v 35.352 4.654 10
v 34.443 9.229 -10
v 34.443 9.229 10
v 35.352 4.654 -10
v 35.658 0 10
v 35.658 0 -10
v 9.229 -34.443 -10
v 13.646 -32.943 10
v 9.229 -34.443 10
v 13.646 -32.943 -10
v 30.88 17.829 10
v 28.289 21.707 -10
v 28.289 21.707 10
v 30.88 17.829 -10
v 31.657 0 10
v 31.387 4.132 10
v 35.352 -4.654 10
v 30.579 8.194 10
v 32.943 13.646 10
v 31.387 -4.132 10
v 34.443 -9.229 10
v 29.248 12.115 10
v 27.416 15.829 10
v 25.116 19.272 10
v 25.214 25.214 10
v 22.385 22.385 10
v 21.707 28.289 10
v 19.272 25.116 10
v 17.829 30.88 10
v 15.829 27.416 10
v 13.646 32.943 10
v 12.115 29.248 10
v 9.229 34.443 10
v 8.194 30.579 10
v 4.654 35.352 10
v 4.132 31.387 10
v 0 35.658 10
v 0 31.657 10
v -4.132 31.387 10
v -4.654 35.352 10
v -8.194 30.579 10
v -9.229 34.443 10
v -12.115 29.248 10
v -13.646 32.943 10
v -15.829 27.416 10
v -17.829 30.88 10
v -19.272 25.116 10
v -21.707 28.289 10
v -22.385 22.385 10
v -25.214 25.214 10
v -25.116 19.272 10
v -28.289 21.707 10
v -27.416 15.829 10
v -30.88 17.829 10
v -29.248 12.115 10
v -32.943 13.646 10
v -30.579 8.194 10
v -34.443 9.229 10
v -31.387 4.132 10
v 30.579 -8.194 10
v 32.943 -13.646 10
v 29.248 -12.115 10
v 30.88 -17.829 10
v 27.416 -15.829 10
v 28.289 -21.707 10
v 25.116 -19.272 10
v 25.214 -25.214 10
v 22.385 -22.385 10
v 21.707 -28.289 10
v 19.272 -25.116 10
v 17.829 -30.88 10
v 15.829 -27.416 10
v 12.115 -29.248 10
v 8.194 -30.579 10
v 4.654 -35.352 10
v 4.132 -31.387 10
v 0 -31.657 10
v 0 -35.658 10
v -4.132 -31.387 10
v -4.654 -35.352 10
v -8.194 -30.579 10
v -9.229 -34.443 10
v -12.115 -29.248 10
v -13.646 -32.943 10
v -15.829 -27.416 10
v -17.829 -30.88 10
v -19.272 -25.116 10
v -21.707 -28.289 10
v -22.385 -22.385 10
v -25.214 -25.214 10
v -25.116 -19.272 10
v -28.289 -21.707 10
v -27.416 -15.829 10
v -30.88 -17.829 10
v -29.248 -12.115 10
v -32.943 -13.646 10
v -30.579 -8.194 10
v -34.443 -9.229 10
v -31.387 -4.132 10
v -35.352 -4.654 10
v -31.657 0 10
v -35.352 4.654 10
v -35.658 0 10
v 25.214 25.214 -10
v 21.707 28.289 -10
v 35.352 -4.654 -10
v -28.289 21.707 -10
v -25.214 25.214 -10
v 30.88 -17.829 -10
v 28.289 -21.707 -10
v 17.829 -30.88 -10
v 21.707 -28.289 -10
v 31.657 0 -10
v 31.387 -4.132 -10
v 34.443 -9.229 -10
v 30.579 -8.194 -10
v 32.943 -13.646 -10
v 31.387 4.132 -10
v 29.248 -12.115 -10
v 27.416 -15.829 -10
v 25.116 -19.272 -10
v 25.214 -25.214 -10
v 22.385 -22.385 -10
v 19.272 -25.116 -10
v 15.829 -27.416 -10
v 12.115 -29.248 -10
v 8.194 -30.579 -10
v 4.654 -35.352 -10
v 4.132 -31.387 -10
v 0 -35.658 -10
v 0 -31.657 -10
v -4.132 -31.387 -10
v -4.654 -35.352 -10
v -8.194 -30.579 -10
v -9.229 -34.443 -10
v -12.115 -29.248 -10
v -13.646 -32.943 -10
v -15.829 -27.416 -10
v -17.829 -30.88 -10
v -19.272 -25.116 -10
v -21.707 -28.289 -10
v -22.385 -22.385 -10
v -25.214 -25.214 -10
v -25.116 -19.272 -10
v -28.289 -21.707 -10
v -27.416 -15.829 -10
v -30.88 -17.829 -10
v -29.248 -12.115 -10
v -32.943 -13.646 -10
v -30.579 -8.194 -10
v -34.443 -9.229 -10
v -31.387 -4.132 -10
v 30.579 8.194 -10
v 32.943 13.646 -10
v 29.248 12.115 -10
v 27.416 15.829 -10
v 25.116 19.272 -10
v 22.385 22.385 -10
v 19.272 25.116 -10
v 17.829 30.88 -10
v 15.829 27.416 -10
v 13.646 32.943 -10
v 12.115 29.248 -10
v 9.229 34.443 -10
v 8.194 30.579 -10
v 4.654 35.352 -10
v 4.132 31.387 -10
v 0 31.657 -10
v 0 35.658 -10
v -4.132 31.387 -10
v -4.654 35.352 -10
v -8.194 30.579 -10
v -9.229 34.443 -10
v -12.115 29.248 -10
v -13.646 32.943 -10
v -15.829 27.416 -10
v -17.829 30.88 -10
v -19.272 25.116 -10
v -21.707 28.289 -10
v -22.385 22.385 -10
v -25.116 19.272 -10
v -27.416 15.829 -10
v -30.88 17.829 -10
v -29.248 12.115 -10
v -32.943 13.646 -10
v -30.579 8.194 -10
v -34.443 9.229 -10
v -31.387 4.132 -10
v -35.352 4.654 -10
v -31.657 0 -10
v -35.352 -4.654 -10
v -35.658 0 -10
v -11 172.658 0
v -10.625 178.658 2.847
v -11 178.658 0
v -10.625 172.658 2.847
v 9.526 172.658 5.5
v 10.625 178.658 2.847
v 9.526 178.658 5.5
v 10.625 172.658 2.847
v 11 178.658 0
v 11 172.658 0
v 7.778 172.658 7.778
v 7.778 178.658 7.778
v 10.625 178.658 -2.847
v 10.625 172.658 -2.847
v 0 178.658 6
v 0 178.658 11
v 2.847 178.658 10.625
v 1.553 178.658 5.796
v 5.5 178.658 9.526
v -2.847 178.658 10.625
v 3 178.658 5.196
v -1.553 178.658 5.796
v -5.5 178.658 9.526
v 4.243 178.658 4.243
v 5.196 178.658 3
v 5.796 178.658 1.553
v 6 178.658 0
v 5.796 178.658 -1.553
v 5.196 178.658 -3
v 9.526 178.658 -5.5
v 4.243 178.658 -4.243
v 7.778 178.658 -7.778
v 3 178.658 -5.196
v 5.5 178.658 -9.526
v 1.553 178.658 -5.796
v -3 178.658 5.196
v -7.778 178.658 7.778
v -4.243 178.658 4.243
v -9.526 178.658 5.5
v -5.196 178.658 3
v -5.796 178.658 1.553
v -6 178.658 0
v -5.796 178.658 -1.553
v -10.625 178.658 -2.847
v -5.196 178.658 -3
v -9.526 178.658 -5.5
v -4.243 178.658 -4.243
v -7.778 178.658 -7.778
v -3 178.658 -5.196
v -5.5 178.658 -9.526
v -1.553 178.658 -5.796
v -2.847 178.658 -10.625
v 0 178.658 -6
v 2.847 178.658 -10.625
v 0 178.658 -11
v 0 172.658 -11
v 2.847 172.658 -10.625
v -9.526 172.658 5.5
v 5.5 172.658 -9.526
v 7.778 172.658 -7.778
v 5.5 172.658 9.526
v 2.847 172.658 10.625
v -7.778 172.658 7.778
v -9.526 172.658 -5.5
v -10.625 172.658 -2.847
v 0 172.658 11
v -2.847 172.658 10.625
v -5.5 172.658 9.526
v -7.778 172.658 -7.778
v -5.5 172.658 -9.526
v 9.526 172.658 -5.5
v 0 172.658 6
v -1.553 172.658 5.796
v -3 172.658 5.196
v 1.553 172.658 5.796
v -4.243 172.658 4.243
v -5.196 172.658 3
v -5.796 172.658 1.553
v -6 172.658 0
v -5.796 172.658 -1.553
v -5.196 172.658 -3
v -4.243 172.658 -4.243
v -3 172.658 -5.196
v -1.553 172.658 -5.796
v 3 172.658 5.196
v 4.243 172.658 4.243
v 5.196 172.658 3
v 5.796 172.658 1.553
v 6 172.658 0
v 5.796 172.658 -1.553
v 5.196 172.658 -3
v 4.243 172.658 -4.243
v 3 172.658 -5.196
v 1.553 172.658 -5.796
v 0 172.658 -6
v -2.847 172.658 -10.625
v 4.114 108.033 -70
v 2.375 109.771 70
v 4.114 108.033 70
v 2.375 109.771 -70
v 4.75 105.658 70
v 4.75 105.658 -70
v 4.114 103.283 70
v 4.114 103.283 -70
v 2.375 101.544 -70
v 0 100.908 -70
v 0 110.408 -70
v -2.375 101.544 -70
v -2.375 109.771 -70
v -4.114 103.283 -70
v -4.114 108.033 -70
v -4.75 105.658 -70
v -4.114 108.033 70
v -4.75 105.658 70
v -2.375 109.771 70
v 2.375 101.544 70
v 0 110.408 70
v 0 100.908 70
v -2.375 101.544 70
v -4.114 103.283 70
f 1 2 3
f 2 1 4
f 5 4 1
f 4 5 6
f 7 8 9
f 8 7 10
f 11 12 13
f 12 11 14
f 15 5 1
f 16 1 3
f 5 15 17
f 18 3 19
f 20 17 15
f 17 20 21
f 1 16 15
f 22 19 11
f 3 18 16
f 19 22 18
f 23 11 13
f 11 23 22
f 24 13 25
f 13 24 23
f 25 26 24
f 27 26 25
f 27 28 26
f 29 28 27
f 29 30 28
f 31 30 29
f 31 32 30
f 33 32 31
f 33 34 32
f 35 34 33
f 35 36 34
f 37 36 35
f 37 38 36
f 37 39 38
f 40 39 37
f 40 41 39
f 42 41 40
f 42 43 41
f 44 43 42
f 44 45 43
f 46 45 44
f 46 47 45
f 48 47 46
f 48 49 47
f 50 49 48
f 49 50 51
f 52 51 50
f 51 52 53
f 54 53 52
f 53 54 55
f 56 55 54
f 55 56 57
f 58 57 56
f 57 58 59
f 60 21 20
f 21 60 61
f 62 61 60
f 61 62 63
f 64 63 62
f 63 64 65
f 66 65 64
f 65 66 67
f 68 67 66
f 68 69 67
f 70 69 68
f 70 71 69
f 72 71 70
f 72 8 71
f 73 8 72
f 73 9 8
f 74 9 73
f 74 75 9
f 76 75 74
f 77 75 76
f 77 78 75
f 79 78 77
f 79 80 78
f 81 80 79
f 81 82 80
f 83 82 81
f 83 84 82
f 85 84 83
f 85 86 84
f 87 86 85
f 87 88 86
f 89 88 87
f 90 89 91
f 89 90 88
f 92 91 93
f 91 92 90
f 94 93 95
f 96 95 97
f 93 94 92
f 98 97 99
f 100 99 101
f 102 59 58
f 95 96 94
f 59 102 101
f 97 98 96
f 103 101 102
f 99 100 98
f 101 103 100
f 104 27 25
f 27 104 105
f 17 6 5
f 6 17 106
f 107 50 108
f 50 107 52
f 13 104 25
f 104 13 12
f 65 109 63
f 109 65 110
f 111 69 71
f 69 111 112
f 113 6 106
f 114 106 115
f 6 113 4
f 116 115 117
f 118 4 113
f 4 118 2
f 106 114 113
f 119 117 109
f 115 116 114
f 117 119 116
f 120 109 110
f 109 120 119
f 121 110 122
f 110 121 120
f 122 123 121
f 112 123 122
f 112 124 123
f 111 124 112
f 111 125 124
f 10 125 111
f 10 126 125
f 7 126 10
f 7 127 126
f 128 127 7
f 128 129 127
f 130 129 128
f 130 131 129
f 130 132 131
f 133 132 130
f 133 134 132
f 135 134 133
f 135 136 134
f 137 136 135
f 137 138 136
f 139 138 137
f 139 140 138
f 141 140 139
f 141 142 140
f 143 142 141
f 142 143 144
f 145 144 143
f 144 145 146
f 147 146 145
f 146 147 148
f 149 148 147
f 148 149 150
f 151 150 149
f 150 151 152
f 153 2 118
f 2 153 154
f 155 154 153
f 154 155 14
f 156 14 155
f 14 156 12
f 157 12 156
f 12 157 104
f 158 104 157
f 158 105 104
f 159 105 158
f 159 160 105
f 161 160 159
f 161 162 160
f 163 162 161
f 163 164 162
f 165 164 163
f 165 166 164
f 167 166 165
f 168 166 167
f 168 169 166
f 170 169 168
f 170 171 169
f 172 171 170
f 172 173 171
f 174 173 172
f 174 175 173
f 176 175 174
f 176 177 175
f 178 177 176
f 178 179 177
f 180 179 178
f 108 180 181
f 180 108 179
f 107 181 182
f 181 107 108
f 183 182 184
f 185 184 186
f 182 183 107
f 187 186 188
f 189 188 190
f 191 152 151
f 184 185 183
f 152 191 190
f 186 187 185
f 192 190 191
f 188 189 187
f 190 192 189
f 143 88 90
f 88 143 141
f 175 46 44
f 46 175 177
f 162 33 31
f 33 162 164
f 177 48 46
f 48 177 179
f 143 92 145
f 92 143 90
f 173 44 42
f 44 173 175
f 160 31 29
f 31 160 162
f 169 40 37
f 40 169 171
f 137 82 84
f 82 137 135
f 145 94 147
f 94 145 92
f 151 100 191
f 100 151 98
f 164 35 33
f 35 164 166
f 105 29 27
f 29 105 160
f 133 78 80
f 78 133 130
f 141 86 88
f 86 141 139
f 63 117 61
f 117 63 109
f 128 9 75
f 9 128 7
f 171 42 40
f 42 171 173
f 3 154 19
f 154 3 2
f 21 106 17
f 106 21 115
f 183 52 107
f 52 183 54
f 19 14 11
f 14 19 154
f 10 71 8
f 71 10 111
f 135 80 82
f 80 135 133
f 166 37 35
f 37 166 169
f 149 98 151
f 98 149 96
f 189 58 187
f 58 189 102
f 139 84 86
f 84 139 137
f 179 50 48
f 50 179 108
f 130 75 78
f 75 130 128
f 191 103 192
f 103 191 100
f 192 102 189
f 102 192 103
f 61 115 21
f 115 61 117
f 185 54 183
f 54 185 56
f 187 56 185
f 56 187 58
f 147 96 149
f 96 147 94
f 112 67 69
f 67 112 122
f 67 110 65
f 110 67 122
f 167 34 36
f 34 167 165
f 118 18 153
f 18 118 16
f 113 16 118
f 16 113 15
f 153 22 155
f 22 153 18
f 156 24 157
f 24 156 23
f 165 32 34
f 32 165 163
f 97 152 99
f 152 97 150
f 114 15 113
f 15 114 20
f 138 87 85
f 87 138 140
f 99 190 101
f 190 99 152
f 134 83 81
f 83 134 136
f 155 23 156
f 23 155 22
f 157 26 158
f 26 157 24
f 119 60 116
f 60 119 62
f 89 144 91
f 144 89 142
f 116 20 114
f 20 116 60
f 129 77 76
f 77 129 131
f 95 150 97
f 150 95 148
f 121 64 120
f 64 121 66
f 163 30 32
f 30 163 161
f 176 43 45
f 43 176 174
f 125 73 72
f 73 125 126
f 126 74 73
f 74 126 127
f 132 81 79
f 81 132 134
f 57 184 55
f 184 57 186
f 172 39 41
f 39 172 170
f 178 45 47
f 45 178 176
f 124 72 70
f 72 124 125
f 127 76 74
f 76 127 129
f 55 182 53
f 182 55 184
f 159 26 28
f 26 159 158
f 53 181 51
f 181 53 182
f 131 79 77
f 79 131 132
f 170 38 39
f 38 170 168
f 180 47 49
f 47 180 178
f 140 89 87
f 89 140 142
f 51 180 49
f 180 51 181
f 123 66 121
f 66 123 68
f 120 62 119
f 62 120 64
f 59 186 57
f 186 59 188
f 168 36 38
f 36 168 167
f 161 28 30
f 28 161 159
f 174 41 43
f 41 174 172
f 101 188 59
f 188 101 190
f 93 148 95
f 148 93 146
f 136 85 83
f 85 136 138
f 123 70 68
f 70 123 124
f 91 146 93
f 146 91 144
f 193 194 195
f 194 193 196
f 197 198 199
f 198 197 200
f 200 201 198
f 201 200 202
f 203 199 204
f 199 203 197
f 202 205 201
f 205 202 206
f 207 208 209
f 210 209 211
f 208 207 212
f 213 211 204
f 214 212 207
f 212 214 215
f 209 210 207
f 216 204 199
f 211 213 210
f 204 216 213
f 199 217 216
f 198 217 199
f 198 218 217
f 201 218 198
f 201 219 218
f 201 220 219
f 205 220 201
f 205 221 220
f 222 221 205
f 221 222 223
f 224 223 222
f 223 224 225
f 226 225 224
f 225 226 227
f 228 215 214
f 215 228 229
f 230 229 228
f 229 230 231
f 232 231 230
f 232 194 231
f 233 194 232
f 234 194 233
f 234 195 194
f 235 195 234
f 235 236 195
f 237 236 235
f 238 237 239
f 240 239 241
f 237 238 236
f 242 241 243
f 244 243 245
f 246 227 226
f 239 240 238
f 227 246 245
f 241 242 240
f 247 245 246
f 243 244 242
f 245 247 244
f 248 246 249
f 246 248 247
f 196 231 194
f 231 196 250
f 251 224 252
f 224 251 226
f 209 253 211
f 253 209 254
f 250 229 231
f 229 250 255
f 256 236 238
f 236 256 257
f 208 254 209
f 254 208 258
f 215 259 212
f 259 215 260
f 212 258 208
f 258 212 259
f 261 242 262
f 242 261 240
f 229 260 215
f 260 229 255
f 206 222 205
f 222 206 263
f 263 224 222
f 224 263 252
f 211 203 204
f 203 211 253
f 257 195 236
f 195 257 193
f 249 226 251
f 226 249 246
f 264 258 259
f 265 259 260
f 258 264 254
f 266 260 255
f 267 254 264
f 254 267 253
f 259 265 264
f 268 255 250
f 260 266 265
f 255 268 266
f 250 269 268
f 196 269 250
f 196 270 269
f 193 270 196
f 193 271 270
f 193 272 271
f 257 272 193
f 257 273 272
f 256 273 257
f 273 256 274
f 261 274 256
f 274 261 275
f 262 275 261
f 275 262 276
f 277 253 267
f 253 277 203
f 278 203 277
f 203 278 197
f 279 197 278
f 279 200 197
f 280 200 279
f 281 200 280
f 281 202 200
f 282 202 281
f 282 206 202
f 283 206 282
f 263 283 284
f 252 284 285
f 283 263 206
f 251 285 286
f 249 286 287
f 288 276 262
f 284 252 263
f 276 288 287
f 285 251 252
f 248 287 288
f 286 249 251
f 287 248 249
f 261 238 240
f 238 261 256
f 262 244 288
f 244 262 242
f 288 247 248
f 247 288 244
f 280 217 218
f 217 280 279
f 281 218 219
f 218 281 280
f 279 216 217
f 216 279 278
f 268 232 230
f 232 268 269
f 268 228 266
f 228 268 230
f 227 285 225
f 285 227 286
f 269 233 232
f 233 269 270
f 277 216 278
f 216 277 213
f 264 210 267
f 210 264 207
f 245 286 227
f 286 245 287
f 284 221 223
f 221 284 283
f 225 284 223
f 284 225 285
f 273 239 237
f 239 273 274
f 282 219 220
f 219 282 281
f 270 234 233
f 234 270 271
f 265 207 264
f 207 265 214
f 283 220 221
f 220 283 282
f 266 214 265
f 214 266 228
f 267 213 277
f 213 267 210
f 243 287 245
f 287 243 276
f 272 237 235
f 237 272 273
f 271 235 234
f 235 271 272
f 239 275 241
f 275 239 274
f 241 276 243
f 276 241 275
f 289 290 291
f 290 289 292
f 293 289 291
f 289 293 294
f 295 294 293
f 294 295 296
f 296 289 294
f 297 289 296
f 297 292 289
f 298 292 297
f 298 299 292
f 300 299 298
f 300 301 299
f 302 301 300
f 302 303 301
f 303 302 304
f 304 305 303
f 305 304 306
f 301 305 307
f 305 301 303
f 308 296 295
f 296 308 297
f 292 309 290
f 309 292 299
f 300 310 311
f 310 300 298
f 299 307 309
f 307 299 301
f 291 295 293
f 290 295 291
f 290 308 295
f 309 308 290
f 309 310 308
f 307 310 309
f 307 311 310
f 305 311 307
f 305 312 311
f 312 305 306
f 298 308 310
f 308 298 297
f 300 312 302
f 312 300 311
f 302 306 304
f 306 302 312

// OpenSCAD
// Auto-generated by scripts/author_from_manifest.py (Phase D.3).
// Source: data/phase_d_manifest.json (sku_intent='anvil-fig1000-sway-brace-4-way').
// Do not hand-edit — regenerate from the manifest.
//
// @part anvil_fig1000_sway_brace_4_way
// @kind hanger
// @category brace.4.way
// @display-name "Anvil FIG 1000 Seismic Sway Brace — 4-Way"
// @mfg anvil_international
// @mfg-pn FIG_1000_4W
// @listing UL
// @price-usd 42.00
// @install-minutes 15
// @crew journeyman
// @param size_in number default=2 label="Size" unit="in"
// @port pipe position=[0,0,0] direction=[0,1,0] style=grooved size_in=2 role=run_a

size_in = 2.0;

function od_mm(nps) =
    nps ==   1  ? 33.4 :
    nps == 1.25 ? 42.2 :
    nps == 1.5  ? 48.3 :
    nps ==   2  ? 60.3 :
    nps == 2.5  ? 73.0 :
    nps ==   3  ? 88.9 :
    nps ==   4  ? 114.3 :
    nps ==   6  ? 168.3 :
    nps ==   8  ? 219.1 : 60.3;

od = od_mm(size_in);
ring_id = od * 1.05;
ring_od = ring_id + 8;
strap_w = 20;
rod_len = 140;

union() {
    // Ring
    difference() {
        cylinder(h = strap_w, d = ring_od, center = true, $fn = 48);
        cylinder(h = strap_w + 1, d = ring_id, center = true, $fn = 48);
    }
    // Rod up +Y
    translate([0, rod_len/2 + ring_od/2, 0])
        cylinder(h = rod_len, d = 9.5, center = true, $fn = 12);
    // Top swivel eye
    translate([0, rod_len + ring_od/2, 0])
        rotate([90, 0, 0])
        difference() {
            cylinder(h = 6, d = 22, center = true, $fn = 24);
            cylinder(h = 8, d = 12, center = true, $fn = 24);
        }
}
